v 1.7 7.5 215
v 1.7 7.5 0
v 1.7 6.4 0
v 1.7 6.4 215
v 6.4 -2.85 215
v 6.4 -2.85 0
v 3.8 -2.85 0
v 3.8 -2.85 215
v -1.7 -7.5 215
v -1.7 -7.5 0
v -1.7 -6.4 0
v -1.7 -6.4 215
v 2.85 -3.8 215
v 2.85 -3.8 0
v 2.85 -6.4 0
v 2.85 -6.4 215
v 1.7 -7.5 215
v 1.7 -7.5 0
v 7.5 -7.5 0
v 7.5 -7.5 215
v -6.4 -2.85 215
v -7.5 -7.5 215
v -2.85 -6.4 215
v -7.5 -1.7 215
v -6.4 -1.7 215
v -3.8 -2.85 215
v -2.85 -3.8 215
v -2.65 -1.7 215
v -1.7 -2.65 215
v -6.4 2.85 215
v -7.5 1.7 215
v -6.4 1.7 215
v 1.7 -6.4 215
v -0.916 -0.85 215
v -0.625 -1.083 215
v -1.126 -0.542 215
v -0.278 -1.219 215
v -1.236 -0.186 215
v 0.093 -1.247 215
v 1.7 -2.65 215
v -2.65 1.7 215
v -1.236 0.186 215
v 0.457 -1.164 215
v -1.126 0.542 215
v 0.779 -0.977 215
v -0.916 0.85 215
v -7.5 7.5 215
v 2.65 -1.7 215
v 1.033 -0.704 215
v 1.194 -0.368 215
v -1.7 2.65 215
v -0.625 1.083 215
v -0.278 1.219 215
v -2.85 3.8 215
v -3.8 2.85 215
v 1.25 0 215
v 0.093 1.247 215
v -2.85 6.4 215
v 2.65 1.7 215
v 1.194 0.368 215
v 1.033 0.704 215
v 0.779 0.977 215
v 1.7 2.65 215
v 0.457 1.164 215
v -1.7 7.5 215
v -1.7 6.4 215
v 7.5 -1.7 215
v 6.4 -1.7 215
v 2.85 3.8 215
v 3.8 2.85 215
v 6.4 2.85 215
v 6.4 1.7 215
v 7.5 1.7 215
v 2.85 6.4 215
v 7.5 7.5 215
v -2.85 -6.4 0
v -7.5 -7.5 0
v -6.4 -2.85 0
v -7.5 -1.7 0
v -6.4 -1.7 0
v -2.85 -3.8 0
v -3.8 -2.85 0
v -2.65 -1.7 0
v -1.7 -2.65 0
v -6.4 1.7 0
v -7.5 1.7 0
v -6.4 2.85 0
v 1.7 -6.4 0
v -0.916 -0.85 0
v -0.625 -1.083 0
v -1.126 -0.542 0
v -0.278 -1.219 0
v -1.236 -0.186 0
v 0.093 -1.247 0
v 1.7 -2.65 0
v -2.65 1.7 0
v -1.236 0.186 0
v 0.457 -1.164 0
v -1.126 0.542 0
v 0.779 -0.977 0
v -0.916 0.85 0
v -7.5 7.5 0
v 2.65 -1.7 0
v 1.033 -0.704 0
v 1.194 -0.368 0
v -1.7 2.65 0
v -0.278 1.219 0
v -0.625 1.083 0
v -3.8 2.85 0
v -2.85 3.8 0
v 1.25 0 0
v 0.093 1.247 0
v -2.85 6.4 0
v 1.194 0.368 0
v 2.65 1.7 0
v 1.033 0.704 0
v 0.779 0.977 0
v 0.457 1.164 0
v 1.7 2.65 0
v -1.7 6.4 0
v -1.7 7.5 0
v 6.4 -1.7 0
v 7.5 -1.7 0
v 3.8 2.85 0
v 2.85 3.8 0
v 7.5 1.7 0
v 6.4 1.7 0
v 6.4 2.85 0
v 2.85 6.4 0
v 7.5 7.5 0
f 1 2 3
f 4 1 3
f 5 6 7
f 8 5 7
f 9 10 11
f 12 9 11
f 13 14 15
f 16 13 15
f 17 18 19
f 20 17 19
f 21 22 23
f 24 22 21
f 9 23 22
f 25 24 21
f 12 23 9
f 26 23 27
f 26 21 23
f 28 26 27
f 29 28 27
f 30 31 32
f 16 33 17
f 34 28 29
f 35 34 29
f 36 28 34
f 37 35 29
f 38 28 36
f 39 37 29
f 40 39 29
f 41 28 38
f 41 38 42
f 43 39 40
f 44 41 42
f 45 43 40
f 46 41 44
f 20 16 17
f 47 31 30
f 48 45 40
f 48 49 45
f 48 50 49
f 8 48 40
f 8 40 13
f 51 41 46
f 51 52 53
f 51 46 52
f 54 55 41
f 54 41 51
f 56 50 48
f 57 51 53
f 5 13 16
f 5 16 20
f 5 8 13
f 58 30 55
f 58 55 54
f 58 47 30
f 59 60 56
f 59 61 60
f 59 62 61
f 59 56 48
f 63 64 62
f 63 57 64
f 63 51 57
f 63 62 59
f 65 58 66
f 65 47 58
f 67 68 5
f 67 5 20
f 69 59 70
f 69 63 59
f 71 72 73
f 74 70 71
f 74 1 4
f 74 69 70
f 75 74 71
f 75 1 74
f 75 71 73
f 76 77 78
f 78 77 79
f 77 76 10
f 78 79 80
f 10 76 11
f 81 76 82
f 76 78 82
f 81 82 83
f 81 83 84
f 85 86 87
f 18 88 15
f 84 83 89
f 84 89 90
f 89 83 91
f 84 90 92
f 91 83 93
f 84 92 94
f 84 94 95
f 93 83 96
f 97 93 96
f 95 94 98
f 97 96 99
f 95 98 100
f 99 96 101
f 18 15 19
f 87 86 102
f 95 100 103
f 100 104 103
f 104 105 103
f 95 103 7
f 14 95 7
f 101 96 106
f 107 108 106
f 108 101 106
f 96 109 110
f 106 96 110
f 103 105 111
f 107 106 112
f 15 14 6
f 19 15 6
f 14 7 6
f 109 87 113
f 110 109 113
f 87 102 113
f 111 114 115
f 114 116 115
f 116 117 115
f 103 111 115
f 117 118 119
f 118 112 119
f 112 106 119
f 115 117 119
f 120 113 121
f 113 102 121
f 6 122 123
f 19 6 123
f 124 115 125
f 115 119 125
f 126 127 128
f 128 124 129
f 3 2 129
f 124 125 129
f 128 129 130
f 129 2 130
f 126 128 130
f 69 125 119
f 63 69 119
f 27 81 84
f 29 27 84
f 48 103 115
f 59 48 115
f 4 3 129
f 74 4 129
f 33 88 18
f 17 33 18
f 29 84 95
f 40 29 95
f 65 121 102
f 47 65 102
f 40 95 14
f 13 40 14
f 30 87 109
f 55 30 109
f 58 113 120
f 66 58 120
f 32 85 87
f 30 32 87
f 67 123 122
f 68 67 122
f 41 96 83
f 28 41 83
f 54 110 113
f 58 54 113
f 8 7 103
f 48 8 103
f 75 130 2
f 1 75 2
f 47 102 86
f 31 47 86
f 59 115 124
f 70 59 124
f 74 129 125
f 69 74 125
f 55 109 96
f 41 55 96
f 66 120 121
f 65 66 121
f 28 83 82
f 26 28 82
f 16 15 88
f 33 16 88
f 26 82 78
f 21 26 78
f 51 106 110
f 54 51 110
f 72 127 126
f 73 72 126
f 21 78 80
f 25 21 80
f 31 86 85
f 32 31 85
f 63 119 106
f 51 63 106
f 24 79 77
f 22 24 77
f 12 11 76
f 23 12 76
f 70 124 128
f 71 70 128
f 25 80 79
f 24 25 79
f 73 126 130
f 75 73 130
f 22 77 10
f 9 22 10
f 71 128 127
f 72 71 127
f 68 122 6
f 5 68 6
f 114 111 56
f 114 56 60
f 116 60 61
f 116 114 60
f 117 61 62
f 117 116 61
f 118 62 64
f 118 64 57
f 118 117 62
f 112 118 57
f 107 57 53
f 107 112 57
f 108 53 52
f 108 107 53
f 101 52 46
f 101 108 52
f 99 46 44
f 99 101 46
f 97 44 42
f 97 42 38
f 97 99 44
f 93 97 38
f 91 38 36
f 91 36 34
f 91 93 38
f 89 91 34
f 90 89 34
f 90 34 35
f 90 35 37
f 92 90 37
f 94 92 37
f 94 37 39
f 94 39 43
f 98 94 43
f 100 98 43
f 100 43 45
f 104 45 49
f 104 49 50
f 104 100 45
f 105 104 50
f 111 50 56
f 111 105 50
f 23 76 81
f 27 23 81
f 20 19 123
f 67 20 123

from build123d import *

# Parameters (mm, degrees)
SKETCH_2_R      = 1.25
EXTRUDE_1_DEPTH = 215


with BuildPart() as part:
    # ｽｹｯﾁ2 → ﾎﾞｽ - 押し出し1 (new body)
    with BuildSketch(Plane.XY):
        Polygon((1.7, 2.65), (-1.7, 2.65), (-2.85, 3.8), (-2.85, 6.4), (-1.7, 6.4), (-1.7, 7.5), (-7.5, 7.5), (-7.5, 1.7), (-6.4, 1.7), (-6.4, 2.85), (-3.8, 2.85), (-2.65, 1.7), (-2.65, -1.7), (-3.8, -2.85), (-6.4, -2.85), (-6.4, -1.7), (-7.5, -1.7), (-7.5, -7.5), (-1.7, -7.5), (-1.7, -6.4), (-2.85, -6.4), (-2.85, -3.8), (-1.7, -2.65), (1.7, -2.65), (2.85, -3.8), (2.85, -6.4), (1.7, -6.4), (1.7, -7.5), (7.5, -7.5), (7.5, -1.7), (6.4, -1.7), (6.4, -2.85), (3.8, -2.85), (2.65, -1.7), (2.65, 1.7), (3.8, 2.85), (6.4, 2.85), (6.4, 1.7), (7.5, 1.7), (7.5, 7.5), (1.7, 7.5), (1.7, 6.4), (2.85, 6.4), (2.85, 3.8), align=None)
        Circle(SKETCH_2_R, mode=Mode.SUBTRACT)
    extrude(amount=EXTRUDE_1_DEPTH)


solid = part.part
